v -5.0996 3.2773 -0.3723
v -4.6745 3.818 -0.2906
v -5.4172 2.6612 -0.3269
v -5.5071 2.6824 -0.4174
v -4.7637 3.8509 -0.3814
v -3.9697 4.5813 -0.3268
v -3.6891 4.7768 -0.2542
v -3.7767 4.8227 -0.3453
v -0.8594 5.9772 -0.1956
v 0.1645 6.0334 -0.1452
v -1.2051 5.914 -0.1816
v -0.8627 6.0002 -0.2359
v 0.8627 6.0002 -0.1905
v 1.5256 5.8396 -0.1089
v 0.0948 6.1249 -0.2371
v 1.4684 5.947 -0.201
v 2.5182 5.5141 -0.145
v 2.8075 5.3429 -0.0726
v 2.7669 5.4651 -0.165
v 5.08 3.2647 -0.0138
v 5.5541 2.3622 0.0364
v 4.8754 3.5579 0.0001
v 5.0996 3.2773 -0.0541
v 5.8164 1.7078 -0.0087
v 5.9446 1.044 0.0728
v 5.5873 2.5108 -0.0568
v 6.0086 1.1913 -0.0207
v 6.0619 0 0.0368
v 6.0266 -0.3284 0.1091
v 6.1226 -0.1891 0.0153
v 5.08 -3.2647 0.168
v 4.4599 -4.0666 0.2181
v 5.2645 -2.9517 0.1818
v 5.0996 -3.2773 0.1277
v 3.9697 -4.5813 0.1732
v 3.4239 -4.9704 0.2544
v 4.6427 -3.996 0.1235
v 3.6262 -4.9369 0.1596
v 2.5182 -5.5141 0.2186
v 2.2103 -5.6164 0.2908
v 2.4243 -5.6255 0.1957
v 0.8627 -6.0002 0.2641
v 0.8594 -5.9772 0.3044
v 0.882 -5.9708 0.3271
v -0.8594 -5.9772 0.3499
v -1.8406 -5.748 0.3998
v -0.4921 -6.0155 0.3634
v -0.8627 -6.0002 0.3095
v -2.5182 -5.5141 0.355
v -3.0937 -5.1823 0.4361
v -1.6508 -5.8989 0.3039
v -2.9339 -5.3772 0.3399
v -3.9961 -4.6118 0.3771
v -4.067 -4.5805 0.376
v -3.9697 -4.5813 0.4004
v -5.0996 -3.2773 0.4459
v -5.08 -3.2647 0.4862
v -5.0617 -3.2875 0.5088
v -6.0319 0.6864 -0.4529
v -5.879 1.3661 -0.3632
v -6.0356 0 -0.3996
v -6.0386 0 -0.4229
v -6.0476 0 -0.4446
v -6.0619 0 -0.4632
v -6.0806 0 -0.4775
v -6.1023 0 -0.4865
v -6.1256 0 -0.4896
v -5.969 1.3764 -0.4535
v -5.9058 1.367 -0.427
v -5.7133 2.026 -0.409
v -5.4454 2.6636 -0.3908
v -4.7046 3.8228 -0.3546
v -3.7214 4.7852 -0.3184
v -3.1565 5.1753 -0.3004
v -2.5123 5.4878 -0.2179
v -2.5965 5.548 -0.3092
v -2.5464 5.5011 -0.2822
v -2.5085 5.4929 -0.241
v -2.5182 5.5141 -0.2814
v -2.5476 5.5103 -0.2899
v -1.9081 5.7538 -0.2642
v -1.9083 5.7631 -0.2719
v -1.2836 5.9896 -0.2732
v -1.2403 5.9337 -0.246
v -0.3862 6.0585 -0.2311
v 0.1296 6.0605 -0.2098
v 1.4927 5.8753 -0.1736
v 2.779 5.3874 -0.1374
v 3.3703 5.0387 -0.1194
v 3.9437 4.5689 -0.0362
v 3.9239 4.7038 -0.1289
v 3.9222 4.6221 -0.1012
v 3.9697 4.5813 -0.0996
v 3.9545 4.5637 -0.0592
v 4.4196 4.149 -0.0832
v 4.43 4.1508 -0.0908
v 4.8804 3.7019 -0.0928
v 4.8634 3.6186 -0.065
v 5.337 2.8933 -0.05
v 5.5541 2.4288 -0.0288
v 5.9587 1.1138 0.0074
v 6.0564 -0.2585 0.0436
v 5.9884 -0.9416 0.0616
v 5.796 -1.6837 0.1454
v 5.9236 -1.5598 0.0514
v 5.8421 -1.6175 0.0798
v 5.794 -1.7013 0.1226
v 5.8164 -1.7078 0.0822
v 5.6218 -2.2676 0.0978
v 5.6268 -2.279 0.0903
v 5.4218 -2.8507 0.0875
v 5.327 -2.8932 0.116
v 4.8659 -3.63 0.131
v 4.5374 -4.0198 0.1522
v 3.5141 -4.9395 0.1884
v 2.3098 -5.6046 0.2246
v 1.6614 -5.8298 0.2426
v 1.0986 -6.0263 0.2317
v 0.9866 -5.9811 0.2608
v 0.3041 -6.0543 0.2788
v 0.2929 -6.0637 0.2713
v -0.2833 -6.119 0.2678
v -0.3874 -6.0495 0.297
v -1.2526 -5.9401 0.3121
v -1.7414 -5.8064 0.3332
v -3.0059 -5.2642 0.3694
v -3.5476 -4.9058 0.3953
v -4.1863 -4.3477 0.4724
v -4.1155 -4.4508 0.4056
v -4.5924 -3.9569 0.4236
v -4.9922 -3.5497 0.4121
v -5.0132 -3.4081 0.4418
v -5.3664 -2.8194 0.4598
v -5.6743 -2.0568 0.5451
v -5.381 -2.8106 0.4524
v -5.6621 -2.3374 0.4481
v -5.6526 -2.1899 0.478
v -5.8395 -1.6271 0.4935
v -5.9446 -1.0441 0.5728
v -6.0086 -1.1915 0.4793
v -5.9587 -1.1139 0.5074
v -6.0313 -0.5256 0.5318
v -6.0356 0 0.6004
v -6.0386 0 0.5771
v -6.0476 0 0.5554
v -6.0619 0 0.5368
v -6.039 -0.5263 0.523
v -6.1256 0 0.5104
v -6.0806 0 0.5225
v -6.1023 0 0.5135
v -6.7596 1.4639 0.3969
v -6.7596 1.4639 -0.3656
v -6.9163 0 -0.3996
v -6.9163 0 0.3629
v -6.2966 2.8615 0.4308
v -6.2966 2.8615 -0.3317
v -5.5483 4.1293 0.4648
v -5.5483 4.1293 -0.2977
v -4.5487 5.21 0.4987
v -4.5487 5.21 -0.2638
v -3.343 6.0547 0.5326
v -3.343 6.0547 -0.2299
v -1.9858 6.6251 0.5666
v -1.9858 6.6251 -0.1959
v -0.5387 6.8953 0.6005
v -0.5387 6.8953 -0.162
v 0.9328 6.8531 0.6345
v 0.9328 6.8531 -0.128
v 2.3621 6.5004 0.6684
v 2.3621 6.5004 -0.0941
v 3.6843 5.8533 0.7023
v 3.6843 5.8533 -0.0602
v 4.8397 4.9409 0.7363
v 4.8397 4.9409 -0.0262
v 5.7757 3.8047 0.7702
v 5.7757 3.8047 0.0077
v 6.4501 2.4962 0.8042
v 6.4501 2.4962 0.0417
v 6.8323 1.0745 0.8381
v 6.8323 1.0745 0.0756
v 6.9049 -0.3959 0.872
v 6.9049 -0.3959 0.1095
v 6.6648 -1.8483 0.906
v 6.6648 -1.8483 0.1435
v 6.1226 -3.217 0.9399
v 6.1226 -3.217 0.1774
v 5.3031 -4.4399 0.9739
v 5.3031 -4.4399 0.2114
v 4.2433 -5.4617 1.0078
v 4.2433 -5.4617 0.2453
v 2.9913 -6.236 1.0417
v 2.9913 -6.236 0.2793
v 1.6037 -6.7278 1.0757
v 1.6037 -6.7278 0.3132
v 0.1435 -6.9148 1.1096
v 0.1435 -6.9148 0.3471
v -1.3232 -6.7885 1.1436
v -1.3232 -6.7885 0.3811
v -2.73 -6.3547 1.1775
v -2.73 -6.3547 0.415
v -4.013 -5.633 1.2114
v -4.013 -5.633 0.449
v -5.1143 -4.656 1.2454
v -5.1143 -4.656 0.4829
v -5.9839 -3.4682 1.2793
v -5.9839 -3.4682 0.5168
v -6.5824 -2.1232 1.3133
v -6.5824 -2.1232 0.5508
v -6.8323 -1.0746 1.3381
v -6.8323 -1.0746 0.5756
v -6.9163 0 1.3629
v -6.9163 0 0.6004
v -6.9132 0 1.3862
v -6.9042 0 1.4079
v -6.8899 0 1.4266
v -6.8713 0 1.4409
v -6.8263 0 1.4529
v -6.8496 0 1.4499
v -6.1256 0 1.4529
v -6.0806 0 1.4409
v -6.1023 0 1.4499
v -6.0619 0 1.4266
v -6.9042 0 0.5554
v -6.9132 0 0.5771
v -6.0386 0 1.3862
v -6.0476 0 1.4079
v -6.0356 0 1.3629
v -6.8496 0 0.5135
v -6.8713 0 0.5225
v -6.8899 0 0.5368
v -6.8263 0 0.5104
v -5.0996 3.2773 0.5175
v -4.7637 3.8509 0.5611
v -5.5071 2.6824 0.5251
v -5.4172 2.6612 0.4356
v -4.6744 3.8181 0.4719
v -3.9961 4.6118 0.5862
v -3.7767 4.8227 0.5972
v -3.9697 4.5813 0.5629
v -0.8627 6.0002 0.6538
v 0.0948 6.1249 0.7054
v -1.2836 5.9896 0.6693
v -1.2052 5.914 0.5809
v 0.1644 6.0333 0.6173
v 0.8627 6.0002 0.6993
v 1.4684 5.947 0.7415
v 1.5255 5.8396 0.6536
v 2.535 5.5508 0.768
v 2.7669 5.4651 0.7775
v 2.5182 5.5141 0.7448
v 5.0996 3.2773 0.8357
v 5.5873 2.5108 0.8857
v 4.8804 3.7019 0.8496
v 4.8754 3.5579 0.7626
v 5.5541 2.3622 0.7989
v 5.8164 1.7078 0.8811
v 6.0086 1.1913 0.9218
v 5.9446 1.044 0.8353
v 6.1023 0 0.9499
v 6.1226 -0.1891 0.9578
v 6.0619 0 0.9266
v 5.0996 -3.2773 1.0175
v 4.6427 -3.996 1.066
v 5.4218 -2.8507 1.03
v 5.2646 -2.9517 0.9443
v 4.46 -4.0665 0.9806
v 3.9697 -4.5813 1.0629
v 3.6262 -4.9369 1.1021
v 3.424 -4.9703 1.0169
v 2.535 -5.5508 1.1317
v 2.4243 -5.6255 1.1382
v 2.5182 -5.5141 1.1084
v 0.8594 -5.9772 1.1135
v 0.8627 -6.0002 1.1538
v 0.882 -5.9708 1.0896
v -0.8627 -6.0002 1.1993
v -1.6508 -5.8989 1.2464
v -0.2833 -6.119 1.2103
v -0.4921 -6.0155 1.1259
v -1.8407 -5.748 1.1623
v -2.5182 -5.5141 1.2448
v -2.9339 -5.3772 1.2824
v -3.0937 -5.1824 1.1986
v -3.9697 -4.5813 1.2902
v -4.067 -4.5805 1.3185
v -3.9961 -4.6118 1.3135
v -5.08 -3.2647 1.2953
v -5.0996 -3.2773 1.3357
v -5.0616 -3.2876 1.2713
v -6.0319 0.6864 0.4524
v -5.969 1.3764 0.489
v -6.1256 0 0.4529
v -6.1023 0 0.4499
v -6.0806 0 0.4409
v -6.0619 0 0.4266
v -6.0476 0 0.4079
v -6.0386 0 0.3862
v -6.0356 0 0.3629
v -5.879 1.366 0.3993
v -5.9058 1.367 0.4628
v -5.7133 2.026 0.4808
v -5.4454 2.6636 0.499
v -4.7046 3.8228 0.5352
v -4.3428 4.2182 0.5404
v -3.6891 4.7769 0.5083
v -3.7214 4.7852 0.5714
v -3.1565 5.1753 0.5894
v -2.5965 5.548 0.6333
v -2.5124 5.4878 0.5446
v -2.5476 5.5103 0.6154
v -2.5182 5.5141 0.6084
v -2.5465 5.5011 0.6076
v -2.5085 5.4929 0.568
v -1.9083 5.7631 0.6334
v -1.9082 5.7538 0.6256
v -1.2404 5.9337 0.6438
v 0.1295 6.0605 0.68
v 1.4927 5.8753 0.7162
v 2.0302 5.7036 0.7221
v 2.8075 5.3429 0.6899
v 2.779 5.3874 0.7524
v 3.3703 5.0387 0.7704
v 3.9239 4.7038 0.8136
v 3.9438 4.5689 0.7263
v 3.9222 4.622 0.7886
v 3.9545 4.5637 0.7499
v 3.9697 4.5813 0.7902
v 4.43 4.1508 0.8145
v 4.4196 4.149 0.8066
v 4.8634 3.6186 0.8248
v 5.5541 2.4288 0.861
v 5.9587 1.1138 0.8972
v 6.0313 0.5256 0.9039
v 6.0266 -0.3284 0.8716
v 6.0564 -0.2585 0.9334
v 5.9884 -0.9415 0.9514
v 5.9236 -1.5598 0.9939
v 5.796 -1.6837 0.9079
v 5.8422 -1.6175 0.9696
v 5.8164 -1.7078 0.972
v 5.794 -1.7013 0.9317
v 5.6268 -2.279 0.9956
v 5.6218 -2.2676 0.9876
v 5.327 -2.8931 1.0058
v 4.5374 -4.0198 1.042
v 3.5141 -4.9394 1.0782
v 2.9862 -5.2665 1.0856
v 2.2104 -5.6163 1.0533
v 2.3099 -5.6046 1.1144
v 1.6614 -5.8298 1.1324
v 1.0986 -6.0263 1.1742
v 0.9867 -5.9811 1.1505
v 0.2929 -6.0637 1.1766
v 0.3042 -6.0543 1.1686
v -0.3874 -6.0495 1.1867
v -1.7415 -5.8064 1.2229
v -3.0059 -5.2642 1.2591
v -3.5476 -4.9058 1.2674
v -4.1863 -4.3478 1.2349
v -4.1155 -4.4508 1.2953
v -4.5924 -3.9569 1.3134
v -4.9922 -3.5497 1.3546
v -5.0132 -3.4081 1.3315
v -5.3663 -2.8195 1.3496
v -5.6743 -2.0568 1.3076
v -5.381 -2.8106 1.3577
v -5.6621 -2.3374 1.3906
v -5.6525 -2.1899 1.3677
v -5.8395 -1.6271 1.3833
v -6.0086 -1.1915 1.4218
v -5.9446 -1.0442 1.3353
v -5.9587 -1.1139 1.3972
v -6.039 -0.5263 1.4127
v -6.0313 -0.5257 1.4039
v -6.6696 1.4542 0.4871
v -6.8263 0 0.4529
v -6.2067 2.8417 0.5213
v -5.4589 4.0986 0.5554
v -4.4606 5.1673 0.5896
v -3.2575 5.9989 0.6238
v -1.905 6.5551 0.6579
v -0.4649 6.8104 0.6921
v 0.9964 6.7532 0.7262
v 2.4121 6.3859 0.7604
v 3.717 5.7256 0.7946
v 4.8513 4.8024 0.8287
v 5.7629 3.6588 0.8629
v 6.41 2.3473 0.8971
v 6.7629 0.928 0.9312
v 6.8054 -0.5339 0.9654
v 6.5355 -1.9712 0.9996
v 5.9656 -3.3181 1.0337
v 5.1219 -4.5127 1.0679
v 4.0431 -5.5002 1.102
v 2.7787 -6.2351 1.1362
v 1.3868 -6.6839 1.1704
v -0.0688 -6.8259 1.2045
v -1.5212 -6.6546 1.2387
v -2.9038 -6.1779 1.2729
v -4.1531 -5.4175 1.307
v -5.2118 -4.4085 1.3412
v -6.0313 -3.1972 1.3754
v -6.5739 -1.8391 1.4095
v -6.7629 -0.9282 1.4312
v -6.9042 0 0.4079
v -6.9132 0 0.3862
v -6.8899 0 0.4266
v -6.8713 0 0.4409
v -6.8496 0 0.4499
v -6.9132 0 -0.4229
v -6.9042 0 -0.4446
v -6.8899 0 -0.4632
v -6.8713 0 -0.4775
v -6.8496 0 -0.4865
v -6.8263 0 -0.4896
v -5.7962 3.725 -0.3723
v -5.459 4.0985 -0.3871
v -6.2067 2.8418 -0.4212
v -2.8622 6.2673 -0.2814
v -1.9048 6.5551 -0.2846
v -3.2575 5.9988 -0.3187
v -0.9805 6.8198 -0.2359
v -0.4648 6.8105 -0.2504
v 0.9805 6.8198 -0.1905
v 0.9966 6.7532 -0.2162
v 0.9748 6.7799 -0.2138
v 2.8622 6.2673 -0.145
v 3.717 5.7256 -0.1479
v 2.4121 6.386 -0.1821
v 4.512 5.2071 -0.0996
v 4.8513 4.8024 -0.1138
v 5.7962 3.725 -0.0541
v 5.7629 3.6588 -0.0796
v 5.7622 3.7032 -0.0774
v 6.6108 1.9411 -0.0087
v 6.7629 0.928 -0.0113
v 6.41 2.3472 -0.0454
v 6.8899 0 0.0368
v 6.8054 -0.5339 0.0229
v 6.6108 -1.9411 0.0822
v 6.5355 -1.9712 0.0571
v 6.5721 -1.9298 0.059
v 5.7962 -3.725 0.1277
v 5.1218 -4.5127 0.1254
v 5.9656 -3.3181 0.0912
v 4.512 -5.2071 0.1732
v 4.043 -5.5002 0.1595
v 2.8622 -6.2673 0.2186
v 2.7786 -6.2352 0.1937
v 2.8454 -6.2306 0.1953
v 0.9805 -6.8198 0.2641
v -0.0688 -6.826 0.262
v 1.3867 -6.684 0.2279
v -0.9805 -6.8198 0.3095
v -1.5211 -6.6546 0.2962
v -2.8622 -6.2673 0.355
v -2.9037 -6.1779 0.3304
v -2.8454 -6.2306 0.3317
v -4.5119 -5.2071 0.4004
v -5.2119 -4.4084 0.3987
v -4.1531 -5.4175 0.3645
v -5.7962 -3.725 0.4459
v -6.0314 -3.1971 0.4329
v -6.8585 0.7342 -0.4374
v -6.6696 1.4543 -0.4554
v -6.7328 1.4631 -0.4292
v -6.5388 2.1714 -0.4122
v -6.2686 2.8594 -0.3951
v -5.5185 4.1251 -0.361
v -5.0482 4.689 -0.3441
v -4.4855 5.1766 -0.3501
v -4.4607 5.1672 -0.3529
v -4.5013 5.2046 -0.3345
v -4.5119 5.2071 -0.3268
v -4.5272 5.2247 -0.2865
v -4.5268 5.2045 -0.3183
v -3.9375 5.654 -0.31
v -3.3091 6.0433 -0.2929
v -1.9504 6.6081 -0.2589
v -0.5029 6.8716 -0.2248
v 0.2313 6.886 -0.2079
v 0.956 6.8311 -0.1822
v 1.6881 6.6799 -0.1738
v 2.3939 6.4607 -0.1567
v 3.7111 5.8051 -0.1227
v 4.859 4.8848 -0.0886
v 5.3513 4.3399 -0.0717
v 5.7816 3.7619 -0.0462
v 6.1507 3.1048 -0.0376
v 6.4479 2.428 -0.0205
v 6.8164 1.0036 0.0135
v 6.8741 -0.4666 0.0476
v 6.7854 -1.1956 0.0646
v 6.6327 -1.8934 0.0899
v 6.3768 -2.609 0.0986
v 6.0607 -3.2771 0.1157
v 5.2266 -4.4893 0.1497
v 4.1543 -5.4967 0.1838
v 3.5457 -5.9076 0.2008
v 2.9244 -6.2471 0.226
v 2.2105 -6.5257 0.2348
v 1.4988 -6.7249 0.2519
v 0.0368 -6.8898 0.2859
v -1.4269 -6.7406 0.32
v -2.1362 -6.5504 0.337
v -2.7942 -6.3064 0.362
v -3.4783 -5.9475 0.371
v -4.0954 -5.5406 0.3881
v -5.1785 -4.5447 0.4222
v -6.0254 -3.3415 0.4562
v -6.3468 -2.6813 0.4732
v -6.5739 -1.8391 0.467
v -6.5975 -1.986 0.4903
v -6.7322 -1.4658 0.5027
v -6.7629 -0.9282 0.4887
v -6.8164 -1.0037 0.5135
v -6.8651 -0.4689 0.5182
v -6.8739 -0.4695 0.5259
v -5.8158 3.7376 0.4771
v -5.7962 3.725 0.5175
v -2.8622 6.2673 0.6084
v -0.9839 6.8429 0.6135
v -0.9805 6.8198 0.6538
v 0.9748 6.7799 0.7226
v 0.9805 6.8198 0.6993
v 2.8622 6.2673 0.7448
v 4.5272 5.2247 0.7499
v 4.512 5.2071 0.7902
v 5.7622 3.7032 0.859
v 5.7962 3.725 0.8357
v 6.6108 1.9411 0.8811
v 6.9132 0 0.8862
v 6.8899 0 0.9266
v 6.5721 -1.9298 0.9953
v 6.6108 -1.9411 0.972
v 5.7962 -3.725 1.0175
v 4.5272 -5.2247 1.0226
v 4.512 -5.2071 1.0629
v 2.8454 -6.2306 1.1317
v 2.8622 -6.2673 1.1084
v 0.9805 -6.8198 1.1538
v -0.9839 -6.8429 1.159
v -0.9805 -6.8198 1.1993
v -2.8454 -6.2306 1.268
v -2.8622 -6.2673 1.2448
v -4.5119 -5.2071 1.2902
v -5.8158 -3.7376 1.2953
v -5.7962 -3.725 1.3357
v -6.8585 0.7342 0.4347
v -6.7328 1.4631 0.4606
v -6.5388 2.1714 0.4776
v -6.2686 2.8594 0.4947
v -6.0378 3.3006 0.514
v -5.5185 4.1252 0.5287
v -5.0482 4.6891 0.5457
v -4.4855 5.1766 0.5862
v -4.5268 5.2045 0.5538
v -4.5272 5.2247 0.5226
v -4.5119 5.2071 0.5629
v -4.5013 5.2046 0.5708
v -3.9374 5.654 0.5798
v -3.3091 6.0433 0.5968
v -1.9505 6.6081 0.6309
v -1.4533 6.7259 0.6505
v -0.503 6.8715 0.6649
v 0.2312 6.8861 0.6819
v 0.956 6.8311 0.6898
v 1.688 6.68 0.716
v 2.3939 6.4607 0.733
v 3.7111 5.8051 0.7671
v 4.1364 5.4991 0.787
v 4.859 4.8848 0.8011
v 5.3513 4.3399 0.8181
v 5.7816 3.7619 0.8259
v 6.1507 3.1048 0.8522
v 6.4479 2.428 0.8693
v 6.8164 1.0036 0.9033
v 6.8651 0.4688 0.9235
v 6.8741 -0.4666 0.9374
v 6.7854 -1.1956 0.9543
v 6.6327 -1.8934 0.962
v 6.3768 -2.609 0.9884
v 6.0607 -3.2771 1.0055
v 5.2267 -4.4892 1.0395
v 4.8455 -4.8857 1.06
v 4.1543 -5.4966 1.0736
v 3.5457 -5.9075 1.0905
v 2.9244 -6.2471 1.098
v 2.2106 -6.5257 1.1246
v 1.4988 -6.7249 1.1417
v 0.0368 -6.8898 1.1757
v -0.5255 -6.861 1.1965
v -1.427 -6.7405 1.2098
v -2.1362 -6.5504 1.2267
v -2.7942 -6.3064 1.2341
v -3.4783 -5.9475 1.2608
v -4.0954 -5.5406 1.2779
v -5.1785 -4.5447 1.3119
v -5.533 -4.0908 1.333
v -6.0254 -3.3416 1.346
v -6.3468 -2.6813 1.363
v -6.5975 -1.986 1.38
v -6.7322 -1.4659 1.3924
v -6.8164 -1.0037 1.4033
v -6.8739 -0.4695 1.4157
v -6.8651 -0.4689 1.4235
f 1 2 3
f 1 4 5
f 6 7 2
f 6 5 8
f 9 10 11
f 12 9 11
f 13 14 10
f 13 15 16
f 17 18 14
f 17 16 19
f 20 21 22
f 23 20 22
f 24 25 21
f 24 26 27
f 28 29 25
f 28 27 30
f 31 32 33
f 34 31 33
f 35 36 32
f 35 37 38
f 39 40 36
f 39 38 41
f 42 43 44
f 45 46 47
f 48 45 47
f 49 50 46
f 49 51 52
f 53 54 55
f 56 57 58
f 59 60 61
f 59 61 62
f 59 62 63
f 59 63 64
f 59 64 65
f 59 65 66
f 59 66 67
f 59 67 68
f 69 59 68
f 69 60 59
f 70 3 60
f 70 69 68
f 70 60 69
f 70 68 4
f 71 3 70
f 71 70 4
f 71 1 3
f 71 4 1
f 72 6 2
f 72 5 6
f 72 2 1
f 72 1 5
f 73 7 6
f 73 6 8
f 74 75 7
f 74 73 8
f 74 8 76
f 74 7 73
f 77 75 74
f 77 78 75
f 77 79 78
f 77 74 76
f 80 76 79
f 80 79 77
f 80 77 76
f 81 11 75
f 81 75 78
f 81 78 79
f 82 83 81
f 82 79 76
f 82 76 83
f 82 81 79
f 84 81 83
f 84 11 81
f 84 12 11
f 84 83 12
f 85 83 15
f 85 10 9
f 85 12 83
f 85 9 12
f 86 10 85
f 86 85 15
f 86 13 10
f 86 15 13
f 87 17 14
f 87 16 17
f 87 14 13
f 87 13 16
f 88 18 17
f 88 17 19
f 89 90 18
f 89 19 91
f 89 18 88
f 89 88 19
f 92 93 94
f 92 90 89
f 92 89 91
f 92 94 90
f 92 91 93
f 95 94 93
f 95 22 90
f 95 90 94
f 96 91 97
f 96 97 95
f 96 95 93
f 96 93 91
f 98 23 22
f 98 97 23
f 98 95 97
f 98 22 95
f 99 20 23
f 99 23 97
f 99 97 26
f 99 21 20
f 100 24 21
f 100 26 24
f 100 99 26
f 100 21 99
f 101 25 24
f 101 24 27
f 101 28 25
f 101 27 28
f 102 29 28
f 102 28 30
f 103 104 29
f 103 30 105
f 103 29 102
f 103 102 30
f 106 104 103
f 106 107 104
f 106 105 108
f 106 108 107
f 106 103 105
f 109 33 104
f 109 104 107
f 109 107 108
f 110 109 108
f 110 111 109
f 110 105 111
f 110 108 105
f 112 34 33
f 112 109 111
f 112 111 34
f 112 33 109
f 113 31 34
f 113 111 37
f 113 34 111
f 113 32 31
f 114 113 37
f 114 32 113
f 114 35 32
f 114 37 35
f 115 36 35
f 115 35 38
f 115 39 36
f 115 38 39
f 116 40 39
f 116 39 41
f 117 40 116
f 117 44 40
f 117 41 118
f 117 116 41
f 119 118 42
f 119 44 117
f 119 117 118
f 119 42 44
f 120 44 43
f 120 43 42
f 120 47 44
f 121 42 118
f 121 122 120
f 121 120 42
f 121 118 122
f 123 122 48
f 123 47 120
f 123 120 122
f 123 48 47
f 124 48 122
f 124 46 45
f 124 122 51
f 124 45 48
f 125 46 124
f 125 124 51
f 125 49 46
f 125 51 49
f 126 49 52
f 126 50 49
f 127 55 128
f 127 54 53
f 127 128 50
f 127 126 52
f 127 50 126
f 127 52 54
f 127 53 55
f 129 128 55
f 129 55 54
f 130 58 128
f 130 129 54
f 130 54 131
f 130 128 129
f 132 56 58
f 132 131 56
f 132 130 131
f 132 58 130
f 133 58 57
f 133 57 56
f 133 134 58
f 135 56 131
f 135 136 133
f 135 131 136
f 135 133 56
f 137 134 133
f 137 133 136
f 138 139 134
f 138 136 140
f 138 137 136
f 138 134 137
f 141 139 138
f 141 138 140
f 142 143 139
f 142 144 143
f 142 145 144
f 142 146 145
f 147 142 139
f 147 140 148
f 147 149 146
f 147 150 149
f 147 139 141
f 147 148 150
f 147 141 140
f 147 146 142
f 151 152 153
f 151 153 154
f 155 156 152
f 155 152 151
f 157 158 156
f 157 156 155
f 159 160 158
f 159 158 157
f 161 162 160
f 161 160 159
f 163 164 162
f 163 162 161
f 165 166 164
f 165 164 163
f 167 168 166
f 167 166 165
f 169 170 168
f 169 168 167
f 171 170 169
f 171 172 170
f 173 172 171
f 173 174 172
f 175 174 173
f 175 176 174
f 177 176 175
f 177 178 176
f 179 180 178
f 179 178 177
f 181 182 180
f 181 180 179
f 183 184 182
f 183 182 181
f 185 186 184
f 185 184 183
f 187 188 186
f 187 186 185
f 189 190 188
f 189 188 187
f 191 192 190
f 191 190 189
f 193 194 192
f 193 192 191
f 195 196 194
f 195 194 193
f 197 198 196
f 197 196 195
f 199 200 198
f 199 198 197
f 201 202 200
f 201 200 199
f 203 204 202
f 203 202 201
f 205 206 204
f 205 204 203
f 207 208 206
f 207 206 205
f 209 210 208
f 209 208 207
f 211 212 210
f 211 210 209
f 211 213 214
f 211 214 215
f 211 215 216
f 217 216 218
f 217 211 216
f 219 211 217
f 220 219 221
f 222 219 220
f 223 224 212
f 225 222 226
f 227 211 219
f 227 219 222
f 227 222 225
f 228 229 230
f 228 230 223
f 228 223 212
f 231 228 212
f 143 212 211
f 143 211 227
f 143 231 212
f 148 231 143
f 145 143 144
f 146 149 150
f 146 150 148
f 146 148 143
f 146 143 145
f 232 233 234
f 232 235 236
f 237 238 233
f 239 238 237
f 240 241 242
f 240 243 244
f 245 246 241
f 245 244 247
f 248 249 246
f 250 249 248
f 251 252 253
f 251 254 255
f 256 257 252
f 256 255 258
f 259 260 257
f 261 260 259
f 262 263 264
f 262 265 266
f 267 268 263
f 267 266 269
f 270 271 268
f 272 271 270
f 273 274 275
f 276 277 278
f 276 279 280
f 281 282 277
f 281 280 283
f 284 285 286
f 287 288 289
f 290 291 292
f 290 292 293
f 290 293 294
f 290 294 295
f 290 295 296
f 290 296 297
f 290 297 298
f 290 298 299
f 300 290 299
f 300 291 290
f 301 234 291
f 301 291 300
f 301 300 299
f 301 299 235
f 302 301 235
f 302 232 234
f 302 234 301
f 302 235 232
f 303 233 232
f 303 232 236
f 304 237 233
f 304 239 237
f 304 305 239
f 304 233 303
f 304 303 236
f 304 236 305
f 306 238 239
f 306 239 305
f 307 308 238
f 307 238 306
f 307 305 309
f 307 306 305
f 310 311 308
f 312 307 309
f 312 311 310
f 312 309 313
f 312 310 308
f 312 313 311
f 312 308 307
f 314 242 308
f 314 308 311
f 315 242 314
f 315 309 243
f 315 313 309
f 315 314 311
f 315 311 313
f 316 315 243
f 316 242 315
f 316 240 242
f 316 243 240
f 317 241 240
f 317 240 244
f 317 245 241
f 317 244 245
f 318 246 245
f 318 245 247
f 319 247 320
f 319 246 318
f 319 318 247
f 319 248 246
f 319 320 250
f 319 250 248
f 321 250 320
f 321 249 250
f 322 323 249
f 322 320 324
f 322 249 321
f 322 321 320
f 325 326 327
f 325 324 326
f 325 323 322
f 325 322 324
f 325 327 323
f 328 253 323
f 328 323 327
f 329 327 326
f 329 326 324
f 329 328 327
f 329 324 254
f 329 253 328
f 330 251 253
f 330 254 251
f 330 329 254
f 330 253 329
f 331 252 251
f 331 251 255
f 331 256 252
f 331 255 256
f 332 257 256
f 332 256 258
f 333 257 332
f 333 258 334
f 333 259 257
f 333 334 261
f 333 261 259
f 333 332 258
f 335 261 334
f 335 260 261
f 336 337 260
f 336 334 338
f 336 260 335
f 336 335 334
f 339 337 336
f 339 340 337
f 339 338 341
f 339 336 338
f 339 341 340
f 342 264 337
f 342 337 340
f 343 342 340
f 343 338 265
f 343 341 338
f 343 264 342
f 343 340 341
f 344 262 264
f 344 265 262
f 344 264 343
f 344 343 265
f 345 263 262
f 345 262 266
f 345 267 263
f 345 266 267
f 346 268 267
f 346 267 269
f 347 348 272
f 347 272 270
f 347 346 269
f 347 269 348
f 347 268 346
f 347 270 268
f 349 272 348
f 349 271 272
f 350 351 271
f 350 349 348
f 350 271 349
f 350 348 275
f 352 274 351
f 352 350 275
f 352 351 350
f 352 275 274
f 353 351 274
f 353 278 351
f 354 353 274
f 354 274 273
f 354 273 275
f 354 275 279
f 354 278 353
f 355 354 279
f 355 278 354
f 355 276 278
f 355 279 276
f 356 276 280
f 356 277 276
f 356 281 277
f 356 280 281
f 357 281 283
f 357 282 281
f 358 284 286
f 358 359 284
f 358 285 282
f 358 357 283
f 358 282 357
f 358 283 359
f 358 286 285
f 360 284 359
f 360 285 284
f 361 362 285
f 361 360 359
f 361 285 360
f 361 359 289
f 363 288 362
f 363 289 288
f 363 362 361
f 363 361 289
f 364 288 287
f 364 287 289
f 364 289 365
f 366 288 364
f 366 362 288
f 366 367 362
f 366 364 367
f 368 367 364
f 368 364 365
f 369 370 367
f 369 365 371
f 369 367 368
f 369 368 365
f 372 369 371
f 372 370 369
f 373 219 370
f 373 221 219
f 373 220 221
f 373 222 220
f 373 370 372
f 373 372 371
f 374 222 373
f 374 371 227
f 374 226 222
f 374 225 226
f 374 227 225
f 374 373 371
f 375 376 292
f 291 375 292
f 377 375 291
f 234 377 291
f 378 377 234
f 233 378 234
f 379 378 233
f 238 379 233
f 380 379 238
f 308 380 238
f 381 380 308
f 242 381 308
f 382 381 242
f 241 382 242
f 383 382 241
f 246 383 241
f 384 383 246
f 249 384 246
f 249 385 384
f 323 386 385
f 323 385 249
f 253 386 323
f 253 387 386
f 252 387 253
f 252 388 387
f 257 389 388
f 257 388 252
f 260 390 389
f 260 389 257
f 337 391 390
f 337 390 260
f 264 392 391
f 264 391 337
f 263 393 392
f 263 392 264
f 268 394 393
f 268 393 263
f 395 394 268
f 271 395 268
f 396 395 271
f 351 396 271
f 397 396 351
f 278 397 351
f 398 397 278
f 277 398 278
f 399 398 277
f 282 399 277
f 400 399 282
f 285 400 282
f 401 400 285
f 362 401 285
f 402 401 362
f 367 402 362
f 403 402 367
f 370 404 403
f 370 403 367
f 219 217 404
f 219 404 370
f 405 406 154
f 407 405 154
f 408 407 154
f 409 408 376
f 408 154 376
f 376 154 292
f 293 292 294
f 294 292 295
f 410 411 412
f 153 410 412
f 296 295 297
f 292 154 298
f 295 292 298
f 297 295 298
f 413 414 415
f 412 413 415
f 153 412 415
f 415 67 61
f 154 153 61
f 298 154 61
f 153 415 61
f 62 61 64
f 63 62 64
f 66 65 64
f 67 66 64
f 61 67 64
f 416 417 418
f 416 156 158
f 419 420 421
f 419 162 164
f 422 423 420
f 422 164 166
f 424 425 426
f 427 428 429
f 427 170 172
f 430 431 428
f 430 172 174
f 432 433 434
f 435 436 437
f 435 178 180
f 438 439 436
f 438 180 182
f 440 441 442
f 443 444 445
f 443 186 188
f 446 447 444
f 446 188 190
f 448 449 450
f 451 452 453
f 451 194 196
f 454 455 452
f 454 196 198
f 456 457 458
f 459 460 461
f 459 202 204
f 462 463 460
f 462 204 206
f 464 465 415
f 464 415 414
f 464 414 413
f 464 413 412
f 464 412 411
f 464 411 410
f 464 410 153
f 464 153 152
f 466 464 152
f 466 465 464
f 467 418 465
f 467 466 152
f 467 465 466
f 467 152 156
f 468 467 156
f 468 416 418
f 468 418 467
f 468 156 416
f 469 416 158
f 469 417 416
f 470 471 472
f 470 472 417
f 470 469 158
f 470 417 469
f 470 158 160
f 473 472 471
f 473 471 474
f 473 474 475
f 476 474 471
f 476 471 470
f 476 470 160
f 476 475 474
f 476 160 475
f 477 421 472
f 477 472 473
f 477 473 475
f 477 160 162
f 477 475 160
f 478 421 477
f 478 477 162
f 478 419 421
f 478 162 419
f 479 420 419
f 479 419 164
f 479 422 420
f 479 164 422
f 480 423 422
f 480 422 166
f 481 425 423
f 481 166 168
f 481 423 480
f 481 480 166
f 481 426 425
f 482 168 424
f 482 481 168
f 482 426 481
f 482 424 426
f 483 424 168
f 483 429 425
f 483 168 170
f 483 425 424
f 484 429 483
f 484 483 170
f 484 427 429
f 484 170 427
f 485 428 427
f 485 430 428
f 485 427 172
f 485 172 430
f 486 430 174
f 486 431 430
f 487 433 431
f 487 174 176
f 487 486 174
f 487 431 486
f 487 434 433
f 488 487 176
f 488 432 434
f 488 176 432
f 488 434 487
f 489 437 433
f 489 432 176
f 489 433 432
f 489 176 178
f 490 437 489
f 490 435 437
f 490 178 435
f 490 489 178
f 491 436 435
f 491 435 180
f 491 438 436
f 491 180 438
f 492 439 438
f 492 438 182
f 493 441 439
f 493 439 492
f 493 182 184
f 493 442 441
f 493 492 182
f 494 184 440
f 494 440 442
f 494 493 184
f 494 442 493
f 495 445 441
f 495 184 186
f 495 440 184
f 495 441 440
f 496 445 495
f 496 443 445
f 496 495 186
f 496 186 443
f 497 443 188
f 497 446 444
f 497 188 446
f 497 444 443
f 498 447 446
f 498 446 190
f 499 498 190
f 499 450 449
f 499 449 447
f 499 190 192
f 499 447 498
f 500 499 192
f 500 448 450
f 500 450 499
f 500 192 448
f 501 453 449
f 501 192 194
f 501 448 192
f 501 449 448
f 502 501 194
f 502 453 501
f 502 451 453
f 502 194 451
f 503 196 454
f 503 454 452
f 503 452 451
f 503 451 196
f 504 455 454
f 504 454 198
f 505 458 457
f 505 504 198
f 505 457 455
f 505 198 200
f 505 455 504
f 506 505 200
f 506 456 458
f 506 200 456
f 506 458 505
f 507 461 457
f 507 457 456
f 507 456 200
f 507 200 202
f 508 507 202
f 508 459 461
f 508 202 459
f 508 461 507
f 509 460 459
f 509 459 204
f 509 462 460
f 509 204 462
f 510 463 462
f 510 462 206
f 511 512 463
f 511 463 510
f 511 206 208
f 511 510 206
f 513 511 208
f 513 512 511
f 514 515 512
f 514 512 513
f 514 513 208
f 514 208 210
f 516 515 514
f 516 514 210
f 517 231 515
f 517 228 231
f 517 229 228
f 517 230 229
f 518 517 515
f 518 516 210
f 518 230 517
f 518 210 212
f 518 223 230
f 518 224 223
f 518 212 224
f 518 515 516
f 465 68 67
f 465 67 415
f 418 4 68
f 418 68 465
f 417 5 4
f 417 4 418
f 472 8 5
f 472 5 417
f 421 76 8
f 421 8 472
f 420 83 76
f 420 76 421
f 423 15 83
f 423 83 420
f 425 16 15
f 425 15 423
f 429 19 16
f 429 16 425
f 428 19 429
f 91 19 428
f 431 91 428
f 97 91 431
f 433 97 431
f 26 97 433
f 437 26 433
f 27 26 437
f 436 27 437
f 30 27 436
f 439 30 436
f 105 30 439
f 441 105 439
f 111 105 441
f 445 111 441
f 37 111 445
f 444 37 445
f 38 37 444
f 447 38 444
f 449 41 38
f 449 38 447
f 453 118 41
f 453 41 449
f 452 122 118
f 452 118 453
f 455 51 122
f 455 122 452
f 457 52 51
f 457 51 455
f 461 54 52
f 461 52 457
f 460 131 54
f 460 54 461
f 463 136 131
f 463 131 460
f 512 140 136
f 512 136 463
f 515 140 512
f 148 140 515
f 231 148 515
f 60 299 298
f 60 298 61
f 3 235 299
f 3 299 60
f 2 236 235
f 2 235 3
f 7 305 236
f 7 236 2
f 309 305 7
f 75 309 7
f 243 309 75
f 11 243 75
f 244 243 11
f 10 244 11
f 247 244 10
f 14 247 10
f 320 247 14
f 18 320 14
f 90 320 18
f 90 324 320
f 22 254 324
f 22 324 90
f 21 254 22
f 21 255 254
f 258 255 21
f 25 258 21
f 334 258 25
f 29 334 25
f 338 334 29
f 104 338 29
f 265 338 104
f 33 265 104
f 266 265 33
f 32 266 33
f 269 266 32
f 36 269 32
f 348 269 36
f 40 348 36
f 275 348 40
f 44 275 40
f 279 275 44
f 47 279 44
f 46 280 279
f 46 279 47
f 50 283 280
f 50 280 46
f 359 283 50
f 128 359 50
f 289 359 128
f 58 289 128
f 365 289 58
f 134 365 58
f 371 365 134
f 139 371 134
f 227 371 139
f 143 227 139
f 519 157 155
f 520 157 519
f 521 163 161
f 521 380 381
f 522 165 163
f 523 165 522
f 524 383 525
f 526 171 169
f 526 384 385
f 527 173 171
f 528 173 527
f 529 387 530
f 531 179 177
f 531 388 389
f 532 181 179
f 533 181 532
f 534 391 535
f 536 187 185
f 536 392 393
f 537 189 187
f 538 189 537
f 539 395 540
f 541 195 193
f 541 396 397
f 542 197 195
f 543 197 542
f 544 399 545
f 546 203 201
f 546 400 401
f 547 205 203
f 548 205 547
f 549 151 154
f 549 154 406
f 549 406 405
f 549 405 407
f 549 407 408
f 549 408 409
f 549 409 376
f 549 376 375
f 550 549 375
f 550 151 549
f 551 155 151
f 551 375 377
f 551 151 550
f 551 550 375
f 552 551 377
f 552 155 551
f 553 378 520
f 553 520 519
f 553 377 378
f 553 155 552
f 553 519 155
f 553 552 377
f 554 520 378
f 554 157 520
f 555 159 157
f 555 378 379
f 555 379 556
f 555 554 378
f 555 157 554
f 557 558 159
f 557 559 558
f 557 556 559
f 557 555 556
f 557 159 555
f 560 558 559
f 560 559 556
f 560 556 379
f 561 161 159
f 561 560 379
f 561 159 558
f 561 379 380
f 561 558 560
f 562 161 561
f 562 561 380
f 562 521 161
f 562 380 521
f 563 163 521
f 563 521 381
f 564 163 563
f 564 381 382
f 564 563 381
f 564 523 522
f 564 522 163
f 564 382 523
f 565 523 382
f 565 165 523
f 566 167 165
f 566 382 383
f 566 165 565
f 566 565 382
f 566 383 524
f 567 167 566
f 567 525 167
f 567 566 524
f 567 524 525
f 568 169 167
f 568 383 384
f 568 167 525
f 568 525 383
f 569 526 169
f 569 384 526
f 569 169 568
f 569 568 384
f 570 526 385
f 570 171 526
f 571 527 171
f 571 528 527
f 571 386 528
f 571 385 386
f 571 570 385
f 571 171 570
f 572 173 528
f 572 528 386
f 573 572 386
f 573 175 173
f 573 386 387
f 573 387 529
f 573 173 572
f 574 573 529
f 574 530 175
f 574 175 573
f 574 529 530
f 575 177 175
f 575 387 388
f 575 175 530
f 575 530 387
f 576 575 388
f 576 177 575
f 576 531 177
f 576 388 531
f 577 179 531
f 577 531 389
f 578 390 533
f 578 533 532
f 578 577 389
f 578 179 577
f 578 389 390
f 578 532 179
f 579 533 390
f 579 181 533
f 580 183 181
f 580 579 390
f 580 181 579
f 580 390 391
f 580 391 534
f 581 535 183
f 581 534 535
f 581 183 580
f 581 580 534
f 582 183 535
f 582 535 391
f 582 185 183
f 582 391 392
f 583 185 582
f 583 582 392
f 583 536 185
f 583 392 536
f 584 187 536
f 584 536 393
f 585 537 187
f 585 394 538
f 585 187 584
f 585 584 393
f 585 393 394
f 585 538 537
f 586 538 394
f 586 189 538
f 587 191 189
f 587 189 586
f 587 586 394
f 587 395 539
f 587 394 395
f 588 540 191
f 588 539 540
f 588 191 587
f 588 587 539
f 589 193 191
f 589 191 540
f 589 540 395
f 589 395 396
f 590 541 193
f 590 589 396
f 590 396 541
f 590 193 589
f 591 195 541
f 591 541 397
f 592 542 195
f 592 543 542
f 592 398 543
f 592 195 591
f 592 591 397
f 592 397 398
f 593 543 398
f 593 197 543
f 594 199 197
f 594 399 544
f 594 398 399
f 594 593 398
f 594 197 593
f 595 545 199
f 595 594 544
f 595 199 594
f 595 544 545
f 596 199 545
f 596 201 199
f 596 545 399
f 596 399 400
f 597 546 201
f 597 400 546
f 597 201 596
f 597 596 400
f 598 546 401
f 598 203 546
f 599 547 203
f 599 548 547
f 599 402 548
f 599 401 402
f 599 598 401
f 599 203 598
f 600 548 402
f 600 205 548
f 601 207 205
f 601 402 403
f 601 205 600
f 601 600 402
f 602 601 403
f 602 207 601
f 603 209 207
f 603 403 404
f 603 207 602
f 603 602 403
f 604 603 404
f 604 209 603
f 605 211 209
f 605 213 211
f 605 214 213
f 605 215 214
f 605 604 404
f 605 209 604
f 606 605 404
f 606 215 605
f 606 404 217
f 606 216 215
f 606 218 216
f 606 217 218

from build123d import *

# Parameters (mm, degrees)
SWEEP4_PITCH       = 1
SWEEP4_HEIGHT      = 1
SWEEP4_RADIUS      = 6.5
SWEEP4_START_ANGLE = -180


with BuildPart() as part:
    # Sweep4: sweep along a helix
    with BuildLine() as sweep4_path:
        add(Helix(SWEEP4_PITCH, SWEEP4_HEIGHT, SWEEP4_RADIUS, center=(0, 0, 0), direction=(0, 0, 1), lefthand=True, mode=Mode.PRIVATE).rotate(Axis((0, 0, 0), (0, 0, 1)), SWEEP4_START_ANGLE))
    # Sketch3 → Sweep4 (sweep)
    with BuildSketch(Plane(origin=(0, 0, 0), x_dir=(1, 0, 0), z_dir=(0, 1, 0))):
        with BuildLine():
            Line((-6.8262917, -0.510433316), (-6.125570321, -0.510433316))
            ThreePointArc((-6.125570321, -0.510433316), (-6.06193071, -0.536793706), (-6.035570321, -0.600433316))
            Line((-6.035570321, -0.600433316), (-6.035570321, -1.362929656))
            ThreePointArc((-6.035570321, -1.362929656), (-6.06193071, -1.426569266), (-6.125570321, -1.452929656))
            Line((-6.125570321, -1.452929656), (-6.8262917, -1.452929656))
            ThreePointArc((-6.8262917, -1.452929656), (-6.889931311, -1.426569266), (-6.9162917, -1.362929656))
            Line((-6.9162917, -1.362929656), (-6.9162917, -0.600433316))
            ThreePointArc((-6.9162917, -0.600433316), (-6.889931311, -0.536793706), (-6.8262917, -0.510433316))
        make_face()
    sweep(path=sweep4_path.line, is_frenet=True)


solid = part.part
